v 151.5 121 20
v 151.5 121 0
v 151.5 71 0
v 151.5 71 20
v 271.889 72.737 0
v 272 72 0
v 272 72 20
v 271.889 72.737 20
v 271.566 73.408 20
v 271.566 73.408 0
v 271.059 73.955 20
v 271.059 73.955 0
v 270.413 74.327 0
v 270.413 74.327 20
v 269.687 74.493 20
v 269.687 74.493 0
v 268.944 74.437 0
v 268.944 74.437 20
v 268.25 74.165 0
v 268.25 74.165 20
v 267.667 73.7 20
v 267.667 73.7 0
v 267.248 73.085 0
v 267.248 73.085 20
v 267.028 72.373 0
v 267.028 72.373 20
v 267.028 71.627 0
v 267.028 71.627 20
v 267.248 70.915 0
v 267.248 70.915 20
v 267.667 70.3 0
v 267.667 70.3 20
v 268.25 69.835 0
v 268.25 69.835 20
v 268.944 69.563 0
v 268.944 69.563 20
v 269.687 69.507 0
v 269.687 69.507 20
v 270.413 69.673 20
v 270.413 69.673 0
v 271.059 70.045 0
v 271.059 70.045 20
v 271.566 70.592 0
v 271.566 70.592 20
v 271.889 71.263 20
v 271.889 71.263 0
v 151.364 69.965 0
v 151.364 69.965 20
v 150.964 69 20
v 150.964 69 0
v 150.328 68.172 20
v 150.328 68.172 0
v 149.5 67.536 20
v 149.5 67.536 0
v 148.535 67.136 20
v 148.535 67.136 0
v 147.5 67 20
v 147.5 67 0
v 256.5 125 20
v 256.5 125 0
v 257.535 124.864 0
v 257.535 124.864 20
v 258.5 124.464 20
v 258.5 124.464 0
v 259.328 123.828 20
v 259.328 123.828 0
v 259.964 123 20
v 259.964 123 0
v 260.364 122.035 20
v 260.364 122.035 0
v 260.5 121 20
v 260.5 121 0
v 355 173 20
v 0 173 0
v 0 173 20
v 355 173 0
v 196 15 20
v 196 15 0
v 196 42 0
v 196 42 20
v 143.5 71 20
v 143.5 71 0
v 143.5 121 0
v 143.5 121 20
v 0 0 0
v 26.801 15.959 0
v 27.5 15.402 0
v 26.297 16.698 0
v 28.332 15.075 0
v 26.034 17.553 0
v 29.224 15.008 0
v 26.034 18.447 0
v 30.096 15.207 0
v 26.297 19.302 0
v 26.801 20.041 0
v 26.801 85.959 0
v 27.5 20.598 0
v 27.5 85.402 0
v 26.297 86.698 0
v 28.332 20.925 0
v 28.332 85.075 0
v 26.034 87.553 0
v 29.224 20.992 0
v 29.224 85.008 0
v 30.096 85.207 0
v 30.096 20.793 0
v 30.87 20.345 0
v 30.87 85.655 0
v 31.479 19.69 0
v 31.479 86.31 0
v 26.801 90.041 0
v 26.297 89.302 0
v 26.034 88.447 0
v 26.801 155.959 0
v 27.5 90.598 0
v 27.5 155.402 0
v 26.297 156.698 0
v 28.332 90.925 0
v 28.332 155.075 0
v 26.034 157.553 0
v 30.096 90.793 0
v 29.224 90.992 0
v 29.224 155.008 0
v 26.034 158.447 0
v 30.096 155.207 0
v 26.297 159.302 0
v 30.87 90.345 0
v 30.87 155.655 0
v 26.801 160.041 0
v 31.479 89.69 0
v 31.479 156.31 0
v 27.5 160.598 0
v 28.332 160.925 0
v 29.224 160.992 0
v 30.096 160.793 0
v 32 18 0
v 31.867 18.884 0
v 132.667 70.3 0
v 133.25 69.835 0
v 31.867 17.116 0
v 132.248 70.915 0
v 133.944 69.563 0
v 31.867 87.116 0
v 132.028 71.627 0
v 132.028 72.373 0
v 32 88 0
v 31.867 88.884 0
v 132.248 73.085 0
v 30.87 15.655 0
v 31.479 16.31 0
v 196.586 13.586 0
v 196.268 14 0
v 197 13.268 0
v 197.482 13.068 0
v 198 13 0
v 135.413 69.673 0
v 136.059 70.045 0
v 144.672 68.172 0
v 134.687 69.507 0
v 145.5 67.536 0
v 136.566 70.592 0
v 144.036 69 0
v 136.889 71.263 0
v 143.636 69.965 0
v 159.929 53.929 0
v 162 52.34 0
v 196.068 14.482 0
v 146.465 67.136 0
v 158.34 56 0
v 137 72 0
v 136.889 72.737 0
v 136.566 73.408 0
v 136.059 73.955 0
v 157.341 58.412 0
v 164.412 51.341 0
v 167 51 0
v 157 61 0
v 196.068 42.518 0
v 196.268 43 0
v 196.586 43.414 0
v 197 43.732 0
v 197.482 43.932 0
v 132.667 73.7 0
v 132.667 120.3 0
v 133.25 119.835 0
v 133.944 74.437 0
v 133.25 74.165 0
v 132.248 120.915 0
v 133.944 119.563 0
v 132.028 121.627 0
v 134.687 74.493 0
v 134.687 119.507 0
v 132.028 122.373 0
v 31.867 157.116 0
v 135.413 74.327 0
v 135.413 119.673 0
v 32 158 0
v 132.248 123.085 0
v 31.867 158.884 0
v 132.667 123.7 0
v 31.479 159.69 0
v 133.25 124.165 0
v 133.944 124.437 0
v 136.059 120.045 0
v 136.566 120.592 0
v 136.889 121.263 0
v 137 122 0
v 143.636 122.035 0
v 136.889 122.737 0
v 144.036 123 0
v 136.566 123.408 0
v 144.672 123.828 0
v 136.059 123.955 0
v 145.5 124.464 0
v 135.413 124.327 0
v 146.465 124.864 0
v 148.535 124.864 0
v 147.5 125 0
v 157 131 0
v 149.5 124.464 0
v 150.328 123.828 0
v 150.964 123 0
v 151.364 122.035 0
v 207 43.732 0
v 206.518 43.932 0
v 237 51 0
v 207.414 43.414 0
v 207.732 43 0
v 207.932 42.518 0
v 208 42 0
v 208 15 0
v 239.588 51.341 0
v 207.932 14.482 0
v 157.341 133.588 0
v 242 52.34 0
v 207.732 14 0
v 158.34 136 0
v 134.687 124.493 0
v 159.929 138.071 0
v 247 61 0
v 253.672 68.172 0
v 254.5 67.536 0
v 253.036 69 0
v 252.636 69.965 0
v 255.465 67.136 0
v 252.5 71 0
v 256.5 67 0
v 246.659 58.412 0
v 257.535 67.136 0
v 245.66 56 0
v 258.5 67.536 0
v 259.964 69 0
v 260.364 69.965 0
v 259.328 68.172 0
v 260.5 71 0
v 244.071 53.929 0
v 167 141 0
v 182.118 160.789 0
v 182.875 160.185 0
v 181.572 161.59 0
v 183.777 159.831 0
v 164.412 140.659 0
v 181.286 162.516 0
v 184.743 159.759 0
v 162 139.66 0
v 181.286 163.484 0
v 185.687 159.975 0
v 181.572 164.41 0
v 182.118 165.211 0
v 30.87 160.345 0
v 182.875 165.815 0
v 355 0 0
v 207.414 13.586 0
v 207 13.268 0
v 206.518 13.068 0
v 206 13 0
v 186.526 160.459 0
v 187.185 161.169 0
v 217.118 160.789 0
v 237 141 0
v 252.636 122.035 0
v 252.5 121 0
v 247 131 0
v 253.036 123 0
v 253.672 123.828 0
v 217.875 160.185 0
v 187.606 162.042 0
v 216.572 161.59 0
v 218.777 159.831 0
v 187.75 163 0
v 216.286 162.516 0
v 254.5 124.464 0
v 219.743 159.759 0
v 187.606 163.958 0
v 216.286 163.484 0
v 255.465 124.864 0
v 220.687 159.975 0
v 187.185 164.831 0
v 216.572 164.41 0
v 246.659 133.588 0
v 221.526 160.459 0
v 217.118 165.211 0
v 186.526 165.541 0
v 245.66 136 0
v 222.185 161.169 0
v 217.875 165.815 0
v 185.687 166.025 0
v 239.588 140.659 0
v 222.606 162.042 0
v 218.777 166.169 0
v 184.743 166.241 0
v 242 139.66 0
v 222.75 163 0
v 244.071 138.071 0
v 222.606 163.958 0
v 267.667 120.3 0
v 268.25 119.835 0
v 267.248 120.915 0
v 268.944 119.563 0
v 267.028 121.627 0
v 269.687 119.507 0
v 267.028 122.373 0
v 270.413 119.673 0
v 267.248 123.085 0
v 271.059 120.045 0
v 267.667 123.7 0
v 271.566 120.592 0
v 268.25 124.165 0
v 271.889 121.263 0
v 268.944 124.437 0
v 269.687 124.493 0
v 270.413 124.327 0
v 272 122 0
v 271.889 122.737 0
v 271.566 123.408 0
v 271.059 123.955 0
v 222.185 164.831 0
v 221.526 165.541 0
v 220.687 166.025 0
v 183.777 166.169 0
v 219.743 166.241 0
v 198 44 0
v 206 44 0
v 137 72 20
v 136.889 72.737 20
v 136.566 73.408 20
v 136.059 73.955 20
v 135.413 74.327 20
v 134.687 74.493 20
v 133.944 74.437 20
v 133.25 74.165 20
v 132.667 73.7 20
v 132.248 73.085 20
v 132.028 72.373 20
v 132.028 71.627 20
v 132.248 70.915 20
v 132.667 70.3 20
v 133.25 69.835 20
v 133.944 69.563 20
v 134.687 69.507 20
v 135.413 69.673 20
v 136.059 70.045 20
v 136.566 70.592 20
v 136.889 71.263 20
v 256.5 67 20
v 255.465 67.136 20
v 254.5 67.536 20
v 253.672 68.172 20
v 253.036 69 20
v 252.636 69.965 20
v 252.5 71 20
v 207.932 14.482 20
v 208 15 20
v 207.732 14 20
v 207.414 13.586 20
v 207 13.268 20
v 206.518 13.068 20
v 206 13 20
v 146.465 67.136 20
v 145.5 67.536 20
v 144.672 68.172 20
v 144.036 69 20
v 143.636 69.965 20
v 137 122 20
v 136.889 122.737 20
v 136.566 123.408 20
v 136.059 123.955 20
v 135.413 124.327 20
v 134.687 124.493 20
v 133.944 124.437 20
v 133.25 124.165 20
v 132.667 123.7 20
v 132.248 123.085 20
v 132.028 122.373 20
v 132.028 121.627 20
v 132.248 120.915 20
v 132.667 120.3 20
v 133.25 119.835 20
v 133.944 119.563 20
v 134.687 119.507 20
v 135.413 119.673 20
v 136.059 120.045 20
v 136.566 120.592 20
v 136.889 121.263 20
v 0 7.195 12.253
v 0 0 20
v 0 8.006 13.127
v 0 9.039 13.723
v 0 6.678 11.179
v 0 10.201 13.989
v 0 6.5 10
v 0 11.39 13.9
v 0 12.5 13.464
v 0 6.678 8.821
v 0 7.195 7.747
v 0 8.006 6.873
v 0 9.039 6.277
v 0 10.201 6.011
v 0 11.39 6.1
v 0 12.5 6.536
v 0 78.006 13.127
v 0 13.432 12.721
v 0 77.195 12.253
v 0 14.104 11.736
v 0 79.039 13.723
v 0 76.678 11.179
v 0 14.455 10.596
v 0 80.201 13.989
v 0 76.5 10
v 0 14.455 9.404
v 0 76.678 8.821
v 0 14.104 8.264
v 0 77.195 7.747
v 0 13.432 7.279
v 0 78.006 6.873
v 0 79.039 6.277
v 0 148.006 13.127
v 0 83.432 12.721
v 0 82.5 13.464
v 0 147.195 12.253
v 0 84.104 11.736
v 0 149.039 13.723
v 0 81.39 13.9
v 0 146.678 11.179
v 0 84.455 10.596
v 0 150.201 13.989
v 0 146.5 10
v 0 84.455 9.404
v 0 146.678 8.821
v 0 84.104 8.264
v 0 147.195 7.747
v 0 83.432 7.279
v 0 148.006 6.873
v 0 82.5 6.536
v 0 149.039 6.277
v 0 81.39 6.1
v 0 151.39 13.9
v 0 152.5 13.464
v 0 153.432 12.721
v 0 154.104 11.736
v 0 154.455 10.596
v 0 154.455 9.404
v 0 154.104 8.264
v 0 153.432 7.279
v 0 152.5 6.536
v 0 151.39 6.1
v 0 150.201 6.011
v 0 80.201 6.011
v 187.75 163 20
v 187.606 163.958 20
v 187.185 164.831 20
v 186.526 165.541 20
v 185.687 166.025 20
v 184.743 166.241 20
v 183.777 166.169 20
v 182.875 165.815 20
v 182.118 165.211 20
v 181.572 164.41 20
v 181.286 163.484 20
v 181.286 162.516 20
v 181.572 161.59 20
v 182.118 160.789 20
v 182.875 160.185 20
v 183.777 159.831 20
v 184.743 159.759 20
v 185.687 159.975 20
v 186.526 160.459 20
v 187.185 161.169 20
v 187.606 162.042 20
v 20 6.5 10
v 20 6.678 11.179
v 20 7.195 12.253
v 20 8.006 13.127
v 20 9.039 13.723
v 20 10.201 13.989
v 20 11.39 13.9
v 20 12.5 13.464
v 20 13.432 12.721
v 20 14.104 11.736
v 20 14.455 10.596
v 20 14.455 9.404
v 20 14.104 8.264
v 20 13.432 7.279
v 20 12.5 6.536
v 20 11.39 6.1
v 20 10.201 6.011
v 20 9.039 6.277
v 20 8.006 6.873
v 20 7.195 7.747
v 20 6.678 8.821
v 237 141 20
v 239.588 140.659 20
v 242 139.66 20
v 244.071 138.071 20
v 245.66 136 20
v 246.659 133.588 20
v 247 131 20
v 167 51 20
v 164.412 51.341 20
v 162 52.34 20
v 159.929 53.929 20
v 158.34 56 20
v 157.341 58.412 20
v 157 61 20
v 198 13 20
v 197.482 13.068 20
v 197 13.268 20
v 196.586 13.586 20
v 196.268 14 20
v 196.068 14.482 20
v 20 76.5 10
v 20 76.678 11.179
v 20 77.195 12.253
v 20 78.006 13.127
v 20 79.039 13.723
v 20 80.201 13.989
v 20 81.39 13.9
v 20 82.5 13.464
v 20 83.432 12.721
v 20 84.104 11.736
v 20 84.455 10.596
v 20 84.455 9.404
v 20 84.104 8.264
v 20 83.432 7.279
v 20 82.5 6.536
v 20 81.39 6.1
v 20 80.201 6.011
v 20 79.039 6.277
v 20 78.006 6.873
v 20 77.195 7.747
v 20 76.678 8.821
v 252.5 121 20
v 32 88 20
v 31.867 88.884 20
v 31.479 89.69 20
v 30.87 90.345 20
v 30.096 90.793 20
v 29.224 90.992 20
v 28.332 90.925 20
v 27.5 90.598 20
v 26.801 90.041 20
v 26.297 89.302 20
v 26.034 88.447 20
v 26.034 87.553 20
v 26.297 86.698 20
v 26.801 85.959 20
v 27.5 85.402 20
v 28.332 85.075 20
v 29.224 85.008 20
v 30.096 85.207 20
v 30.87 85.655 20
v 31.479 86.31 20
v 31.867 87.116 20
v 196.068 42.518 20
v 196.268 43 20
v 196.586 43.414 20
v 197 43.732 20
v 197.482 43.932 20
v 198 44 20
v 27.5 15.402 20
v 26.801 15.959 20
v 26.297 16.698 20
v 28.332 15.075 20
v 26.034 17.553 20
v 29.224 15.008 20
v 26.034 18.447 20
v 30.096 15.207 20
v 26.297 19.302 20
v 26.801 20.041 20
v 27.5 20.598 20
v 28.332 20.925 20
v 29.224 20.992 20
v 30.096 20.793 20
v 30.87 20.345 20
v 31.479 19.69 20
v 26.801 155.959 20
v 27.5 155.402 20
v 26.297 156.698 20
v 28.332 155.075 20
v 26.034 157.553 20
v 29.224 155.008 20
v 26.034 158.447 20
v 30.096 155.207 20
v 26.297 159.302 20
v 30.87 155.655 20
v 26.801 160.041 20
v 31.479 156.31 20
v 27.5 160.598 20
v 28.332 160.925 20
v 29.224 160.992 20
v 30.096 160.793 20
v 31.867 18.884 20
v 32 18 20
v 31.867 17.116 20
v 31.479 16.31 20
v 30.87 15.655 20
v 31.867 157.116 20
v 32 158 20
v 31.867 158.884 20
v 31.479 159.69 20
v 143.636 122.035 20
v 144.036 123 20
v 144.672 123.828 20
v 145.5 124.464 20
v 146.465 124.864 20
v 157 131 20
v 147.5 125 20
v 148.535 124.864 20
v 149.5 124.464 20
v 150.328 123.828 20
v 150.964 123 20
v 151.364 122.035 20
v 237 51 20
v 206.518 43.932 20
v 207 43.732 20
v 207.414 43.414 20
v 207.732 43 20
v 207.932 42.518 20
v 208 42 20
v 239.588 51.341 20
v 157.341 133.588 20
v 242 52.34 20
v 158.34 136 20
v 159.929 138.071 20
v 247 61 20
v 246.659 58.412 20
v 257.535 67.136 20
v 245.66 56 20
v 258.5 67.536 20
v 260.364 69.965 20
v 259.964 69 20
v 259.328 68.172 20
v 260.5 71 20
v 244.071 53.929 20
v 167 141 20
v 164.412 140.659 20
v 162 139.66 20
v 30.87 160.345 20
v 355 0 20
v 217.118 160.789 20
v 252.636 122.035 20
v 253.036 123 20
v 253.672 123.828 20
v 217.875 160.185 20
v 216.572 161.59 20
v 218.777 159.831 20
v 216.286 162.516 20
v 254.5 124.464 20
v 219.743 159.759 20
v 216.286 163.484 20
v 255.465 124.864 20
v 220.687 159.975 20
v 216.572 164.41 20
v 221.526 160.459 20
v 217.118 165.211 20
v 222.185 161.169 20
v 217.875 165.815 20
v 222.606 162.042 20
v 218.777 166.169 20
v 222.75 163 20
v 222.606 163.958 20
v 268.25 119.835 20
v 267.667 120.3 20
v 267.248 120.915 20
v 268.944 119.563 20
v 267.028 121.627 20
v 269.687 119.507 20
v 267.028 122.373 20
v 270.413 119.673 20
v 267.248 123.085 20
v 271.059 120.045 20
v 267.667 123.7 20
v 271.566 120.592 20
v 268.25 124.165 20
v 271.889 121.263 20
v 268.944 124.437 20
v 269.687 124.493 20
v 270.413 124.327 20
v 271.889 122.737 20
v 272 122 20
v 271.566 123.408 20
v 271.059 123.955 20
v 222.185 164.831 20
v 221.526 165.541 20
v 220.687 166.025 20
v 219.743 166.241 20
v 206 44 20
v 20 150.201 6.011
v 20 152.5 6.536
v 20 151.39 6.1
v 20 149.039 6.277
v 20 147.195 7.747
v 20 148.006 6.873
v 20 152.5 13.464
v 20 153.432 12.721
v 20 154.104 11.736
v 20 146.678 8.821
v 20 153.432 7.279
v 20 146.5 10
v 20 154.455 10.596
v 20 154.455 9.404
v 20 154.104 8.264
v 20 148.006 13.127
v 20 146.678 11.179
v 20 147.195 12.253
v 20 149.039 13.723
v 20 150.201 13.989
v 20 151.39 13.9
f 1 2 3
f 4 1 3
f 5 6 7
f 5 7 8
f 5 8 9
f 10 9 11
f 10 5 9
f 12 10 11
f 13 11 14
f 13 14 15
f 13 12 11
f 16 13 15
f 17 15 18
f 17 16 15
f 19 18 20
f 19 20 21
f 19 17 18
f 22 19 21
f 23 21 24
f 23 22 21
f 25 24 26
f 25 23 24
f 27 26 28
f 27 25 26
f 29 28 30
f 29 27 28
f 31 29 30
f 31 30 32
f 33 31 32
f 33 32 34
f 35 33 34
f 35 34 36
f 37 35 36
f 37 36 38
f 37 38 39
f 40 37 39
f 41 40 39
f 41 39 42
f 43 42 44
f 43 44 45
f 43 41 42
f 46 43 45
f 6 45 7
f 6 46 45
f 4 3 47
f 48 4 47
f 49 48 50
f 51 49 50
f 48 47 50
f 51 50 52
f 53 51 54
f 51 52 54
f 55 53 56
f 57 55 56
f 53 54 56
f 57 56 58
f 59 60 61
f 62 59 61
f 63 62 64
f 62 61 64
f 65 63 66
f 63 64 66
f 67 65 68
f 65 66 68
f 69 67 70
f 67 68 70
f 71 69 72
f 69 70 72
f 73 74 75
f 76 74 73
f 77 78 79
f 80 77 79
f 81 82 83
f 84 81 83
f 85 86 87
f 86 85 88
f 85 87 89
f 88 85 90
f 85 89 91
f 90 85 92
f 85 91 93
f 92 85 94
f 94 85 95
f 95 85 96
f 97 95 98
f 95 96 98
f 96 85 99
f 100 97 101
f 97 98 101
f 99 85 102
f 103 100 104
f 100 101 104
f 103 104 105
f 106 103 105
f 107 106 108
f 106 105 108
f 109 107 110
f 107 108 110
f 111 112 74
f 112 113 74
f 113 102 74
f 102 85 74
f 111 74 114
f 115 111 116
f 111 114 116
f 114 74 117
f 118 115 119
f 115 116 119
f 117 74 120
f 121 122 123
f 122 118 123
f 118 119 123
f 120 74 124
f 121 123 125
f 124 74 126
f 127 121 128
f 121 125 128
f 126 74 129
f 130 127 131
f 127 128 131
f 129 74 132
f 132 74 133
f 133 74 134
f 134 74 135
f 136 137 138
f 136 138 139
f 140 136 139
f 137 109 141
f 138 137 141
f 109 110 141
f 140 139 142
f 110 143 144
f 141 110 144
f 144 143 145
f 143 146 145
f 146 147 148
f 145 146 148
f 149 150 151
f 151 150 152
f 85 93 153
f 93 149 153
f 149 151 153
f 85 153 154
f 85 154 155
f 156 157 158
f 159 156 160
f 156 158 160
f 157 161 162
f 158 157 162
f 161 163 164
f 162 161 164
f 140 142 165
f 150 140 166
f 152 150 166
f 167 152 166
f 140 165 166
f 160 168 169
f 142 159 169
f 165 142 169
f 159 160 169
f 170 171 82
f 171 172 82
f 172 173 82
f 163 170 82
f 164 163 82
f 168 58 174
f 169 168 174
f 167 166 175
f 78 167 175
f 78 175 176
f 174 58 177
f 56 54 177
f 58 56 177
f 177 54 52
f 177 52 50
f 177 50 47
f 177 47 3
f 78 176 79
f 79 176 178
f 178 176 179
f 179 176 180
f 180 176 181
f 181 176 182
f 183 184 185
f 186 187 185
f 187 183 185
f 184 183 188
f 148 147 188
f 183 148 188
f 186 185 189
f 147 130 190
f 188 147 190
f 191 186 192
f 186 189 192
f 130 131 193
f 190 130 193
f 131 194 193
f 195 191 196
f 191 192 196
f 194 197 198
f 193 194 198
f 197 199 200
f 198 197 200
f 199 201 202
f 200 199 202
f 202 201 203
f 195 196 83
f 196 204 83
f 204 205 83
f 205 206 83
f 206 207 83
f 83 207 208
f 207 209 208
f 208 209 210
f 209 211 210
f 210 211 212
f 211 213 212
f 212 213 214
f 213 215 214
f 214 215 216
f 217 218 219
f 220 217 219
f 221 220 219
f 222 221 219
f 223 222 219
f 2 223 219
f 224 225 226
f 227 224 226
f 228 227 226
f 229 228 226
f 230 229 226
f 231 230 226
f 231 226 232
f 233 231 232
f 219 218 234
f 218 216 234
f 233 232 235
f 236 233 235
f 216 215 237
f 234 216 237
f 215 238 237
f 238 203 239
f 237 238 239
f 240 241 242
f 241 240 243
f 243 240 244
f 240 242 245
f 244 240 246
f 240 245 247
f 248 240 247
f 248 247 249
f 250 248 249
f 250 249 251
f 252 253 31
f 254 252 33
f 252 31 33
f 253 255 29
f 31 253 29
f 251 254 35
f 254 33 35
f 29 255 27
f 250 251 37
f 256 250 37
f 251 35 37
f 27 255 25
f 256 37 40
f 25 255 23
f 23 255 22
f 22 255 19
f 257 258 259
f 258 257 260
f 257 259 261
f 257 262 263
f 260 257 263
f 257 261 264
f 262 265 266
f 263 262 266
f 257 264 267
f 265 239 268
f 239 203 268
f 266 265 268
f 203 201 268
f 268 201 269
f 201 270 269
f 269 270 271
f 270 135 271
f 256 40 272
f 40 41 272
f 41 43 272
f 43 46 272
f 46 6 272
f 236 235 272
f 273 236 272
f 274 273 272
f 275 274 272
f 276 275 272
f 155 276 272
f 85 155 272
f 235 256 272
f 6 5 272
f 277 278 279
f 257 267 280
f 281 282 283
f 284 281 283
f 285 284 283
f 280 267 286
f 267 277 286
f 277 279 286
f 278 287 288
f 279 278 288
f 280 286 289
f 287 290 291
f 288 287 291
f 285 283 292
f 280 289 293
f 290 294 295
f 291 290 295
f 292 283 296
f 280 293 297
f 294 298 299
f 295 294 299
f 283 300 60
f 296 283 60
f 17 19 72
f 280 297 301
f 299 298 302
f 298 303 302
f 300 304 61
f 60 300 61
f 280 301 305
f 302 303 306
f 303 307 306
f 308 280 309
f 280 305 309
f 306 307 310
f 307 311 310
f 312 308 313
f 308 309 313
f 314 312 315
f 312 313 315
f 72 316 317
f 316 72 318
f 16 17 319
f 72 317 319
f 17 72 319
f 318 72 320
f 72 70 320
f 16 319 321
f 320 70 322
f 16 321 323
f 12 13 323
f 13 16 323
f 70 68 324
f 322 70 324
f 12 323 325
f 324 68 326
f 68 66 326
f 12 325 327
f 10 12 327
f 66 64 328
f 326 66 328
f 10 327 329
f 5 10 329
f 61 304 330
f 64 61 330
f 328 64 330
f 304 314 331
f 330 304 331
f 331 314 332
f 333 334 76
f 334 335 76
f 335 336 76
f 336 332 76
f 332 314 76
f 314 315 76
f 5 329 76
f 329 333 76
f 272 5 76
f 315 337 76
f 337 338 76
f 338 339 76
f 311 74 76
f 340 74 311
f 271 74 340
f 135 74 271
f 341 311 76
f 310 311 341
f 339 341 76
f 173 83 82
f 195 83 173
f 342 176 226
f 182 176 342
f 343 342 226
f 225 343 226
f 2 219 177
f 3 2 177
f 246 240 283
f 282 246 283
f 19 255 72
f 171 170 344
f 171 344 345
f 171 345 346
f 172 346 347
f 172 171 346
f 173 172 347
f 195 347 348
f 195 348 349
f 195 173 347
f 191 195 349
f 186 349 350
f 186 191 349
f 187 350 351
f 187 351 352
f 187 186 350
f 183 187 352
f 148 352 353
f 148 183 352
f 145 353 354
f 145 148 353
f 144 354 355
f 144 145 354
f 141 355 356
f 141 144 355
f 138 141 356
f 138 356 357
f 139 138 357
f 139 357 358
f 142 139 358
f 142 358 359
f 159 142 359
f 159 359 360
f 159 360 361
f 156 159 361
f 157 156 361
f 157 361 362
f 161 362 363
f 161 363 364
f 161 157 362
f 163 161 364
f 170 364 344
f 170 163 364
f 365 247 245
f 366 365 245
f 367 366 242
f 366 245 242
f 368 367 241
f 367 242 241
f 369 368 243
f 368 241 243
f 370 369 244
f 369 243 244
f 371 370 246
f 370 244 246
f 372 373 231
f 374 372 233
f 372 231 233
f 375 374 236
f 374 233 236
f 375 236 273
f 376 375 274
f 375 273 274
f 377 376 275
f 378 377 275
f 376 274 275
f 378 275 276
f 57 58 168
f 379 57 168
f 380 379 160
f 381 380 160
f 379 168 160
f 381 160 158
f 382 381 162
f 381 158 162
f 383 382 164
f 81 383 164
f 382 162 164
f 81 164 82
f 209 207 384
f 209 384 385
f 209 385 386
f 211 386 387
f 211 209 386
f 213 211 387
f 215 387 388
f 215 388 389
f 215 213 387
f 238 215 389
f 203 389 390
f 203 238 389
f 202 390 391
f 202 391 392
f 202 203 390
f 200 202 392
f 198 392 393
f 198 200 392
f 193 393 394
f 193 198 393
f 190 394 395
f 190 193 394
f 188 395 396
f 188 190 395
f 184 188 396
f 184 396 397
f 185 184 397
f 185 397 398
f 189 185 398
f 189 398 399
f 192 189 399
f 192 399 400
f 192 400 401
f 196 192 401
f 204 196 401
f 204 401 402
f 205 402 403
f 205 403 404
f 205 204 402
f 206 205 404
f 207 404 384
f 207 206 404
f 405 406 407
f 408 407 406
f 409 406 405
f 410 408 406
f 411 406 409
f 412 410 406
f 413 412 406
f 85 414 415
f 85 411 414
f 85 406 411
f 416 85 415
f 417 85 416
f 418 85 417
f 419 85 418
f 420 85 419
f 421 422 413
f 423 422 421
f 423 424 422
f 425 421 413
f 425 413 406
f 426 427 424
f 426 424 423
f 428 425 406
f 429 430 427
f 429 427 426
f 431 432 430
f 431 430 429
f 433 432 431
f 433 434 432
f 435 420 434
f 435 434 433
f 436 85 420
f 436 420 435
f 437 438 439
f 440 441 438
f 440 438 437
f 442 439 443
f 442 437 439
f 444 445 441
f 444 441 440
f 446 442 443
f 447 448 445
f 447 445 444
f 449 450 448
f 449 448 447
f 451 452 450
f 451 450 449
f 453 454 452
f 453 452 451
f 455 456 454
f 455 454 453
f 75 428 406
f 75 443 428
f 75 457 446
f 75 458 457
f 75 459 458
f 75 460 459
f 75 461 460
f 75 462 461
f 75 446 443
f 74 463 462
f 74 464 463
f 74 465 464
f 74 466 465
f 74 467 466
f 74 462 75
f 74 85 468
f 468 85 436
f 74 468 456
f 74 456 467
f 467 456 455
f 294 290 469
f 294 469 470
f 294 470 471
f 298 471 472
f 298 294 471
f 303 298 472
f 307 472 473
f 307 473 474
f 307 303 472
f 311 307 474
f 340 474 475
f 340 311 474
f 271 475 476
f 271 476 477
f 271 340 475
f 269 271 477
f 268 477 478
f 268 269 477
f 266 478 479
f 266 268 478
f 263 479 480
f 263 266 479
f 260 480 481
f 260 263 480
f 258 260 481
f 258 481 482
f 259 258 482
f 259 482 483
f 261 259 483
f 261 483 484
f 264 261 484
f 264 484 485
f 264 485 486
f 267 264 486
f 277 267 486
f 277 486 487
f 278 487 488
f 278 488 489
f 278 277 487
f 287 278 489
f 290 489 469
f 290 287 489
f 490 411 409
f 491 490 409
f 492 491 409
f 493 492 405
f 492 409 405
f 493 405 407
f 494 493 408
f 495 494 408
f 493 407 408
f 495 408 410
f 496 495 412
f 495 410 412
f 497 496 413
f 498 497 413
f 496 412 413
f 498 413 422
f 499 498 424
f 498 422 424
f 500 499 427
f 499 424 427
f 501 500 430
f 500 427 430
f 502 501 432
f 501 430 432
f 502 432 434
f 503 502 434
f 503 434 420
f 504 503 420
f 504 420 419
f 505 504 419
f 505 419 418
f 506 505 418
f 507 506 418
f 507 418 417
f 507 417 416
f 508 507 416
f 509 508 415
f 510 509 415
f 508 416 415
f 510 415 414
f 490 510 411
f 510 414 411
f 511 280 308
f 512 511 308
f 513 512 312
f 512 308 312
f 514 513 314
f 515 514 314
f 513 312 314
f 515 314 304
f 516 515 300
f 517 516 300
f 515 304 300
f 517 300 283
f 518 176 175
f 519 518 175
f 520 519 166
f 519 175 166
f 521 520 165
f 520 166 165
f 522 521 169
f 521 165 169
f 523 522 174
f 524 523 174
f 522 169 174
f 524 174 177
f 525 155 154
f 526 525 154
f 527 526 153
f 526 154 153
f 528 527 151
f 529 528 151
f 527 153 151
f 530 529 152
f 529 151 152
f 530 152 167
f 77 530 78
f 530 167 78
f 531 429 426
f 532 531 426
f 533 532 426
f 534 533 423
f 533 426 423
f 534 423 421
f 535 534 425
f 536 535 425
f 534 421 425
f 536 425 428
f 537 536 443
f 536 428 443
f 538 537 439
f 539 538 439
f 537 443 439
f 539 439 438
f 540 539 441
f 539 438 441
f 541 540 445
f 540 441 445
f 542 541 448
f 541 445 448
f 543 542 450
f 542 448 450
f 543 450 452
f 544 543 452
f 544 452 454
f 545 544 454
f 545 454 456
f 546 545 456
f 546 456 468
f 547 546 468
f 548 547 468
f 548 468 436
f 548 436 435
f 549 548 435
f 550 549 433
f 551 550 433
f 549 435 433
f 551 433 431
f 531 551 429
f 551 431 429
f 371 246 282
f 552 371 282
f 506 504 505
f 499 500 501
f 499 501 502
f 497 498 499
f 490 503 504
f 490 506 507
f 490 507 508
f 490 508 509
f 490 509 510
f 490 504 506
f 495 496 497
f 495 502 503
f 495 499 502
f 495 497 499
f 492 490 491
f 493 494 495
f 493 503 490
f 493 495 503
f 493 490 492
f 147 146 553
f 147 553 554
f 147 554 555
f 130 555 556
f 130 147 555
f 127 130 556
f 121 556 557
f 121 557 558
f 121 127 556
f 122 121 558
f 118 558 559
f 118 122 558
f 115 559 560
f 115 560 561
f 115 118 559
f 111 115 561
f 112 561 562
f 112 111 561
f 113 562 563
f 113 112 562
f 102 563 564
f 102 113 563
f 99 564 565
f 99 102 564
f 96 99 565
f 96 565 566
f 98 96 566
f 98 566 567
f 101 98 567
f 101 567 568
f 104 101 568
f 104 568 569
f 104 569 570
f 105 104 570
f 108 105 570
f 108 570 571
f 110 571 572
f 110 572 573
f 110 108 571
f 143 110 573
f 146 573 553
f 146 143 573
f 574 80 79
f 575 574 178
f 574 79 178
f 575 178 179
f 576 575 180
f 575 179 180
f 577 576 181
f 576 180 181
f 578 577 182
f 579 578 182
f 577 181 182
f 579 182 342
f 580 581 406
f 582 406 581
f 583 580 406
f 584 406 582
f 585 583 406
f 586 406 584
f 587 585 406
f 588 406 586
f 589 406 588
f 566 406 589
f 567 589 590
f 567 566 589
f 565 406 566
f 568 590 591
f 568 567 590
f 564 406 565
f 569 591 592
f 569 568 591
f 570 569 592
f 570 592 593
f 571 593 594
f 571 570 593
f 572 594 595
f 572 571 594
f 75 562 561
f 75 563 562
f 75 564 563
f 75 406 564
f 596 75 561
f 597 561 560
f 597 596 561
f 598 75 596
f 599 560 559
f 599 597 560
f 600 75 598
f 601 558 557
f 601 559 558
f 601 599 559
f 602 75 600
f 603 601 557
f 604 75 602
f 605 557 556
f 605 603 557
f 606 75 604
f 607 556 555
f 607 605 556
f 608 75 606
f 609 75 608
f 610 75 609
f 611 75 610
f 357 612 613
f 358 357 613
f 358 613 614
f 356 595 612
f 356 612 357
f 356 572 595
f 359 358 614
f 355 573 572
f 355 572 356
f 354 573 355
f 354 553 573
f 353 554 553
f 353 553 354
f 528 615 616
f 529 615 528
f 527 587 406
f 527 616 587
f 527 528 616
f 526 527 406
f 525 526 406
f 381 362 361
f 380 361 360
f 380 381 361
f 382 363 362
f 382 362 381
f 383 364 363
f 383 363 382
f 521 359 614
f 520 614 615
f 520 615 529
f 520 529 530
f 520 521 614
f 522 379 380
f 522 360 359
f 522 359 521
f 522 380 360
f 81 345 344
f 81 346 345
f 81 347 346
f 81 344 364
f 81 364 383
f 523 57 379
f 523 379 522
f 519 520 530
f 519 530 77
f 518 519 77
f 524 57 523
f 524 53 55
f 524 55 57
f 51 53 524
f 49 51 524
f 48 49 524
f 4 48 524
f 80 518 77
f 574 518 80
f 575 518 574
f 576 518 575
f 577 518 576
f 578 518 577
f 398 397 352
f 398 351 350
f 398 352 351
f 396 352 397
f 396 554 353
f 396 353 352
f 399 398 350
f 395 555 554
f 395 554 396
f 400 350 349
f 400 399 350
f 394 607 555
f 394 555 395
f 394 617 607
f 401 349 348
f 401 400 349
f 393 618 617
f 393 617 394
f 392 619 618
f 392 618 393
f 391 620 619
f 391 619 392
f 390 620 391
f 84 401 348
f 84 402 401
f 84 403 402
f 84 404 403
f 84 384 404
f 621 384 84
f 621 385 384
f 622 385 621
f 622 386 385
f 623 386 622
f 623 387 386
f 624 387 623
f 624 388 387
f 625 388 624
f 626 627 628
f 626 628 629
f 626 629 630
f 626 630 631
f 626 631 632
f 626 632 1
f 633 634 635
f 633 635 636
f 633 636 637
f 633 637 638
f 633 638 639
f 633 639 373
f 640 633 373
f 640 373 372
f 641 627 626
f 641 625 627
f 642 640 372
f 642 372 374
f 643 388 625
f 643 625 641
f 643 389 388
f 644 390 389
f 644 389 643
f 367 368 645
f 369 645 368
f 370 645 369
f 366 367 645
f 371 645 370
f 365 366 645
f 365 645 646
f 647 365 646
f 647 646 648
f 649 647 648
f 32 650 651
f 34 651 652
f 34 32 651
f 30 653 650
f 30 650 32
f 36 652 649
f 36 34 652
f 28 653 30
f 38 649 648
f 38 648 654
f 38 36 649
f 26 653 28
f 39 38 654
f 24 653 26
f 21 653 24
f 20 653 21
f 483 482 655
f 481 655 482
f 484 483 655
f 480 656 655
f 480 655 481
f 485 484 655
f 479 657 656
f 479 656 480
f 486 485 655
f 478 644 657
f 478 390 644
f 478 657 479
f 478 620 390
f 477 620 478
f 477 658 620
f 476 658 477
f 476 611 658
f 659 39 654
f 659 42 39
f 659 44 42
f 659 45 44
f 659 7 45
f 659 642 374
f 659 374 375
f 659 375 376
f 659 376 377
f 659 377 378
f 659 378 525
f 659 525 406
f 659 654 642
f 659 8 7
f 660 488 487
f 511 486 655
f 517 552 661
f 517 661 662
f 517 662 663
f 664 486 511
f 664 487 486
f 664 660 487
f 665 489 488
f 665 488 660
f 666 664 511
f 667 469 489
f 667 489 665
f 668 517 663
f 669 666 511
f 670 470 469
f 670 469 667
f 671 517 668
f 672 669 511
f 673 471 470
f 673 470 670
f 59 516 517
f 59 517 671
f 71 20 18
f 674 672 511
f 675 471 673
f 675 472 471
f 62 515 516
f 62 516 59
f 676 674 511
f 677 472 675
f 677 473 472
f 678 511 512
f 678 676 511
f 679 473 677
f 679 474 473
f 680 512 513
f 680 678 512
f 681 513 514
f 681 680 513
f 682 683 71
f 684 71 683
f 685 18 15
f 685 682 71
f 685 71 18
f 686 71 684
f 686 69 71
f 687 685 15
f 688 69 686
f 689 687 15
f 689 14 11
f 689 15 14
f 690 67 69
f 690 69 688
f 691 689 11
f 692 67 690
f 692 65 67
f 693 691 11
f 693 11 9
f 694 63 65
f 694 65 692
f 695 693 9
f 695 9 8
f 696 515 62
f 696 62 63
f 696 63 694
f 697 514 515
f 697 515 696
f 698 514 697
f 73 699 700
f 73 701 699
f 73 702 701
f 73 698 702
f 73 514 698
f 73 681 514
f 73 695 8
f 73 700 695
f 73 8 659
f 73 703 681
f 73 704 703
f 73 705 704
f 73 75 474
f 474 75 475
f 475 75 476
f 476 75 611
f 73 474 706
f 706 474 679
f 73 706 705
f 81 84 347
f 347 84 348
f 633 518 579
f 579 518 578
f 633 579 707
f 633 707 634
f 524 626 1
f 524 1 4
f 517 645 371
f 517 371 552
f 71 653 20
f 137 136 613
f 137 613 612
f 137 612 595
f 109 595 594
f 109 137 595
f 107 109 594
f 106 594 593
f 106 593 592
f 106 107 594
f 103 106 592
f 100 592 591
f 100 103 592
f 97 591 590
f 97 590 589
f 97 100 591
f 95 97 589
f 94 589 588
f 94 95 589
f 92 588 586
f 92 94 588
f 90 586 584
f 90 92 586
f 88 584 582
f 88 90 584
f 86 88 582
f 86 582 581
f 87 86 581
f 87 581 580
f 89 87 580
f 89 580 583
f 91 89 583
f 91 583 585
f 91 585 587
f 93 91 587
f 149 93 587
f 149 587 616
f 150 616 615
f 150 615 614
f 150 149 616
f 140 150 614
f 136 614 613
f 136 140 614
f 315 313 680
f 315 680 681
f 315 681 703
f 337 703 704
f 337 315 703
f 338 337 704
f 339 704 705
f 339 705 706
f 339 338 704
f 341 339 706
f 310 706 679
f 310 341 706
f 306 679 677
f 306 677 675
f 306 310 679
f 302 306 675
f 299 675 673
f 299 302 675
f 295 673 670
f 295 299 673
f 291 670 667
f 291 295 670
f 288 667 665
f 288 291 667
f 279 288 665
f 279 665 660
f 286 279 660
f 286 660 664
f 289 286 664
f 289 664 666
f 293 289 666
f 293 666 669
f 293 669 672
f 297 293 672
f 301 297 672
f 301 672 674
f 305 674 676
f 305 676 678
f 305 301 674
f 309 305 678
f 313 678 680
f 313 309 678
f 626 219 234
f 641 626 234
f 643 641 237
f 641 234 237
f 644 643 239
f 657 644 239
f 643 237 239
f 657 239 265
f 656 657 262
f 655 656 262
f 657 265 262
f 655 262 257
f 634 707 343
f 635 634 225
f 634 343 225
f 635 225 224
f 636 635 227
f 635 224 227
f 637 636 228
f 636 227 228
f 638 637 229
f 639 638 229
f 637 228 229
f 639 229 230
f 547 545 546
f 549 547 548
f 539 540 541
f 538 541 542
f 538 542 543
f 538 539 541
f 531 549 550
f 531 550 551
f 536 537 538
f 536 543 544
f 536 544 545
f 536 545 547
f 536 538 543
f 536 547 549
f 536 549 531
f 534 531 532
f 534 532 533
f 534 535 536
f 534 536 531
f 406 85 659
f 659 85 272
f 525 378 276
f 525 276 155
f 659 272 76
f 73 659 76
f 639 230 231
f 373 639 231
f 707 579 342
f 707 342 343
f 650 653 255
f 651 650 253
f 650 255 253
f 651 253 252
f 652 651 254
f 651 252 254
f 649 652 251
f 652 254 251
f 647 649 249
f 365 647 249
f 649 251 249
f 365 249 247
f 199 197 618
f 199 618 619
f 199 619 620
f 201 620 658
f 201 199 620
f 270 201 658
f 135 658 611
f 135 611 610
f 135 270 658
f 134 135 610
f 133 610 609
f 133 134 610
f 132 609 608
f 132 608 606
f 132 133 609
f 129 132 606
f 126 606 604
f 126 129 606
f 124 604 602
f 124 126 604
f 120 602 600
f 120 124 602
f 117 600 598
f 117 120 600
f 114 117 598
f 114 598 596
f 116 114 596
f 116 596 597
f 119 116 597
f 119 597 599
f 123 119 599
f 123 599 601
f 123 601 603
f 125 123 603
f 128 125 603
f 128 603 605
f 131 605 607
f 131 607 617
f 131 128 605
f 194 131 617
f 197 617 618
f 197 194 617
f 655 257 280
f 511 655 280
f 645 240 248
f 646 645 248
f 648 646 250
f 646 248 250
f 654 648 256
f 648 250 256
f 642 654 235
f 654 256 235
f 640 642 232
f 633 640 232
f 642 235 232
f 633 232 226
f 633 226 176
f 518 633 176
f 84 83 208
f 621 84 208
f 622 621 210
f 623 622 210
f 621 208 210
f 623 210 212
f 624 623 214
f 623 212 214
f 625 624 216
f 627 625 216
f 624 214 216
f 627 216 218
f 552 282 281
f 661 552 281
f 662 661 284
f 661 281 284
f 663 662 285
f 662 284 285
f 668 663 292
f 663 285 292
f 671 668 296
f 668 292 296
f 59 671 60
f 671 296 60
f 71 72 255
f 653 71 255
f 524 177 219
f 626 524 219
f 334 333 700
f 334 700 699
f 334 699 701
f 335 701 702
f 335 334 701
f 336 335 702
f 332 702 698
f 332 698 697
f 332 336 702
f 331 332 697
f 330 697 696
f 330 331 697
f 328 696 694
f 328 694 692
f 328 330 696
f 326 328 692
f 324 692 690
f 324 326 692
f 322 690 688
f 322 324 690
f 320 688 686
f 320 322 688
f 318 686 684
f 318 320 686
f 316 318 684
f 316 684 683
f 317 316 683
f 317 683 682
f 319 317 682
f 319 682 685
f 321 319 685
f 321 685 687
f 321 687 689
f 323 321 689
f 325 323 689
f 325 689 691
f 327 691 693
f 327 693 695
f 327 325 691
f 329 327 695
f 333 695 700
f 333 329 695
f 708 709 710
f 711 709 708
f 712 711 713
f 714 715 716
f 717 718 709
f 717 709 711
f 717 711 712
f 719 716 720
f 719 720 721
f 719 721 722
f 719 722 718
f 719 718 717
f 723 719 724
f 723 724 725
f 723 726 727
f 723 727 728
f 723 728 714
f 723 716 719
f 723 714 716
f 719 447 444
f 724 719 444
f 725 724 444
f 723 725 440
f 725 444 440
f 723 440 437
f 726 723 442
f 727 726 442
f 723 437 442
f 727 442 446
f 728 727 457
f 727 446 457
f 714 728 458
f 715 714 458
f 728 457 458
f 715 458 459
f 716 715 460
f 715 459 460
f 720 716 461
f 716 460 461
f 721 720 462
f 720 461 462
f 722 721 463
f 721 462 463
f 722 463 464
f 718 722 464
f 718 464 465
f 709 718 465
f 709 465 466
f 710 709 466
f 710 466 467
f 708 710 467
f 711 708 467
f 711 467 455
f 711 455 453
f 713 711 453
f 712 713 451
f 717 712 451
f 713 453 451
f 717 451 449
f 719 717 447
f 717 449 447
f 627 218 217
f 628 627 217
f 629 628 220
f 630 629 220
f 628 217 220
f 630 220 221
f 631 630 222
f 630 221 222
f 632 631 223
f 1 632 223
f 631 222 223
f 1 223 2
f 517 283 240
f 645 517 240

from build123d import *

# Parameters (mm, degrees)
F0_W     = 355
F0_H     = 173
F0_R     = 3
F0_R_2   = 2.5
F0_R_3   = 3.25
F1_DEPTH = 20
F2_R     = 4
F3_DEPTH = 20


with BuildPart() as f1:
    # F0 (on Top) → F1 (new body)
    with BuildSketch(Plane.XY):
        with Locations((177.5, 86.5)):
            Rectangle(F0_W, F0_H)
        with Locations((29, 18)):
            Circle(F0_R, mode=Mode.SUBTRACT)
        with Locations((134.5, 72)):
            Circle(F0_R_2, mode=Mode.SUBTRACT)
        with BuildLine():
            Line((206, 13), (198, 13))
            ThreePointArc((198, 13), (196.585786, 13.585786), (196, 15))
            Line((196, 15), (196, 42))
            ThreePointArc((196, 42), (196.585786, 43.414214), (198, 44))
            Line((198, 44), (206, 44))
            ThreePointArc((206, 44), (207.414214, 43.414214), (208, 42))
            Line((208, 42), (208, 15))
            ThreePointArc((208, 15), (207.414214, 13.585786), (206, 13))
        make_face(mode=Mode.SUBTRACT)
        with Locations((269.5, 72)):
            Circle(F0_R_2, mode=Mode.SUBTRACT)
        with Locations((29, 88)):
            Circle(F0_R, mode=Mode.SUBTRACT)
        with BuildLine():
            Line((151.5, 121), (151.5, 71))
            ThreePointArc((151.5, 71), (150.328427, 68.171573), (147.5, 67))
            ThreePointArc((147.5, 67), (144.671573, 68.171573), (143.5, 71))
            Line((143.5, 71), (143.5, 121))
            ThreePointArc((143.5, 121), (144.671573, 123.828427), (147.5, 125))
            ThreePointArc((147.5, 125), (150.328427, 123.828427), (151.5, 121))
        make_face(mode=Mode.SUBTRACT)
        with Locations((134.5, 122)):
            Circle(F0_R_2, mode=Mode.SUBTRACT)
        with Locations((29, 158)):
            Circle(F0_R, mode=Mode.SUBTRACT)
        with BuildLine():
            Line((237, 51), (167, 51))
            ThreePointArc((167, 51), (159.928932, 53.928932), (157, 61))
            Line((157, 61), (157, 131))
            ThreePointArc((157, 131), (159.928932, 138.071068), (167, 141))
            Line((167, 141), (237, 141))
            ThreePointArc((237, 141), (244.071068, 138.071068), (247, 131))
            Line((247, 131), (247, 61))
            ThreePointArc((247, 61), (244.071068, 53.928932), (237, 51))
        make_face(mode=Mode.SUBTRACT)
        with BuildLine():
            ThreePointArc((256.5, 67), (253.671573, 68.171573), (252.5, 71))
            Line((252.5, 71), (252.5, 121))
            ThreePointArc((252.5, 121), (253.671573, 123.828427), (256.5, 125))
            ThreePointArc((256.5, 125), (259.328427, 123.828427), (260.5, 121))
            Line((260.5, 121), (260.5, 71))
            ThreePointArc((260.5, 71), (259.328427, 68.171573), (256.5, 67))
        make_face(mode=Mode.SUBTRACT)
        with Locations((269.5, 122)):
            Circle(F0_R_2, mode=Mode.SUBTRACT)
        with Locations((184.5, 163)):
            Circle(F0_R_3, mode=Mode.SUBTRACT)
        with Locations((219.5, 163)):
            Circle(F0_R_3, mode=Mode.SUBTRACT)
    extrude(amount=F1_DEPTH)

    # F2 (on face) → F3 (cut)
    with BuildSketch(Plane(origin=(0, 0, 0), x_dir=(0, -1, 0), z_dir=(-1, 0, 0))):
        with Locations((-150.5, 10)):
            Circle(F2_R)
        with Locations((-80.5, 10)):
            Circle(F2_R)
        with Locations((-10.5, 10)):
            Circle(F2_R)
    extrude(amount=-F3_DEPTH, mode=Mode.SUBTRACT)


solid = f1.part
